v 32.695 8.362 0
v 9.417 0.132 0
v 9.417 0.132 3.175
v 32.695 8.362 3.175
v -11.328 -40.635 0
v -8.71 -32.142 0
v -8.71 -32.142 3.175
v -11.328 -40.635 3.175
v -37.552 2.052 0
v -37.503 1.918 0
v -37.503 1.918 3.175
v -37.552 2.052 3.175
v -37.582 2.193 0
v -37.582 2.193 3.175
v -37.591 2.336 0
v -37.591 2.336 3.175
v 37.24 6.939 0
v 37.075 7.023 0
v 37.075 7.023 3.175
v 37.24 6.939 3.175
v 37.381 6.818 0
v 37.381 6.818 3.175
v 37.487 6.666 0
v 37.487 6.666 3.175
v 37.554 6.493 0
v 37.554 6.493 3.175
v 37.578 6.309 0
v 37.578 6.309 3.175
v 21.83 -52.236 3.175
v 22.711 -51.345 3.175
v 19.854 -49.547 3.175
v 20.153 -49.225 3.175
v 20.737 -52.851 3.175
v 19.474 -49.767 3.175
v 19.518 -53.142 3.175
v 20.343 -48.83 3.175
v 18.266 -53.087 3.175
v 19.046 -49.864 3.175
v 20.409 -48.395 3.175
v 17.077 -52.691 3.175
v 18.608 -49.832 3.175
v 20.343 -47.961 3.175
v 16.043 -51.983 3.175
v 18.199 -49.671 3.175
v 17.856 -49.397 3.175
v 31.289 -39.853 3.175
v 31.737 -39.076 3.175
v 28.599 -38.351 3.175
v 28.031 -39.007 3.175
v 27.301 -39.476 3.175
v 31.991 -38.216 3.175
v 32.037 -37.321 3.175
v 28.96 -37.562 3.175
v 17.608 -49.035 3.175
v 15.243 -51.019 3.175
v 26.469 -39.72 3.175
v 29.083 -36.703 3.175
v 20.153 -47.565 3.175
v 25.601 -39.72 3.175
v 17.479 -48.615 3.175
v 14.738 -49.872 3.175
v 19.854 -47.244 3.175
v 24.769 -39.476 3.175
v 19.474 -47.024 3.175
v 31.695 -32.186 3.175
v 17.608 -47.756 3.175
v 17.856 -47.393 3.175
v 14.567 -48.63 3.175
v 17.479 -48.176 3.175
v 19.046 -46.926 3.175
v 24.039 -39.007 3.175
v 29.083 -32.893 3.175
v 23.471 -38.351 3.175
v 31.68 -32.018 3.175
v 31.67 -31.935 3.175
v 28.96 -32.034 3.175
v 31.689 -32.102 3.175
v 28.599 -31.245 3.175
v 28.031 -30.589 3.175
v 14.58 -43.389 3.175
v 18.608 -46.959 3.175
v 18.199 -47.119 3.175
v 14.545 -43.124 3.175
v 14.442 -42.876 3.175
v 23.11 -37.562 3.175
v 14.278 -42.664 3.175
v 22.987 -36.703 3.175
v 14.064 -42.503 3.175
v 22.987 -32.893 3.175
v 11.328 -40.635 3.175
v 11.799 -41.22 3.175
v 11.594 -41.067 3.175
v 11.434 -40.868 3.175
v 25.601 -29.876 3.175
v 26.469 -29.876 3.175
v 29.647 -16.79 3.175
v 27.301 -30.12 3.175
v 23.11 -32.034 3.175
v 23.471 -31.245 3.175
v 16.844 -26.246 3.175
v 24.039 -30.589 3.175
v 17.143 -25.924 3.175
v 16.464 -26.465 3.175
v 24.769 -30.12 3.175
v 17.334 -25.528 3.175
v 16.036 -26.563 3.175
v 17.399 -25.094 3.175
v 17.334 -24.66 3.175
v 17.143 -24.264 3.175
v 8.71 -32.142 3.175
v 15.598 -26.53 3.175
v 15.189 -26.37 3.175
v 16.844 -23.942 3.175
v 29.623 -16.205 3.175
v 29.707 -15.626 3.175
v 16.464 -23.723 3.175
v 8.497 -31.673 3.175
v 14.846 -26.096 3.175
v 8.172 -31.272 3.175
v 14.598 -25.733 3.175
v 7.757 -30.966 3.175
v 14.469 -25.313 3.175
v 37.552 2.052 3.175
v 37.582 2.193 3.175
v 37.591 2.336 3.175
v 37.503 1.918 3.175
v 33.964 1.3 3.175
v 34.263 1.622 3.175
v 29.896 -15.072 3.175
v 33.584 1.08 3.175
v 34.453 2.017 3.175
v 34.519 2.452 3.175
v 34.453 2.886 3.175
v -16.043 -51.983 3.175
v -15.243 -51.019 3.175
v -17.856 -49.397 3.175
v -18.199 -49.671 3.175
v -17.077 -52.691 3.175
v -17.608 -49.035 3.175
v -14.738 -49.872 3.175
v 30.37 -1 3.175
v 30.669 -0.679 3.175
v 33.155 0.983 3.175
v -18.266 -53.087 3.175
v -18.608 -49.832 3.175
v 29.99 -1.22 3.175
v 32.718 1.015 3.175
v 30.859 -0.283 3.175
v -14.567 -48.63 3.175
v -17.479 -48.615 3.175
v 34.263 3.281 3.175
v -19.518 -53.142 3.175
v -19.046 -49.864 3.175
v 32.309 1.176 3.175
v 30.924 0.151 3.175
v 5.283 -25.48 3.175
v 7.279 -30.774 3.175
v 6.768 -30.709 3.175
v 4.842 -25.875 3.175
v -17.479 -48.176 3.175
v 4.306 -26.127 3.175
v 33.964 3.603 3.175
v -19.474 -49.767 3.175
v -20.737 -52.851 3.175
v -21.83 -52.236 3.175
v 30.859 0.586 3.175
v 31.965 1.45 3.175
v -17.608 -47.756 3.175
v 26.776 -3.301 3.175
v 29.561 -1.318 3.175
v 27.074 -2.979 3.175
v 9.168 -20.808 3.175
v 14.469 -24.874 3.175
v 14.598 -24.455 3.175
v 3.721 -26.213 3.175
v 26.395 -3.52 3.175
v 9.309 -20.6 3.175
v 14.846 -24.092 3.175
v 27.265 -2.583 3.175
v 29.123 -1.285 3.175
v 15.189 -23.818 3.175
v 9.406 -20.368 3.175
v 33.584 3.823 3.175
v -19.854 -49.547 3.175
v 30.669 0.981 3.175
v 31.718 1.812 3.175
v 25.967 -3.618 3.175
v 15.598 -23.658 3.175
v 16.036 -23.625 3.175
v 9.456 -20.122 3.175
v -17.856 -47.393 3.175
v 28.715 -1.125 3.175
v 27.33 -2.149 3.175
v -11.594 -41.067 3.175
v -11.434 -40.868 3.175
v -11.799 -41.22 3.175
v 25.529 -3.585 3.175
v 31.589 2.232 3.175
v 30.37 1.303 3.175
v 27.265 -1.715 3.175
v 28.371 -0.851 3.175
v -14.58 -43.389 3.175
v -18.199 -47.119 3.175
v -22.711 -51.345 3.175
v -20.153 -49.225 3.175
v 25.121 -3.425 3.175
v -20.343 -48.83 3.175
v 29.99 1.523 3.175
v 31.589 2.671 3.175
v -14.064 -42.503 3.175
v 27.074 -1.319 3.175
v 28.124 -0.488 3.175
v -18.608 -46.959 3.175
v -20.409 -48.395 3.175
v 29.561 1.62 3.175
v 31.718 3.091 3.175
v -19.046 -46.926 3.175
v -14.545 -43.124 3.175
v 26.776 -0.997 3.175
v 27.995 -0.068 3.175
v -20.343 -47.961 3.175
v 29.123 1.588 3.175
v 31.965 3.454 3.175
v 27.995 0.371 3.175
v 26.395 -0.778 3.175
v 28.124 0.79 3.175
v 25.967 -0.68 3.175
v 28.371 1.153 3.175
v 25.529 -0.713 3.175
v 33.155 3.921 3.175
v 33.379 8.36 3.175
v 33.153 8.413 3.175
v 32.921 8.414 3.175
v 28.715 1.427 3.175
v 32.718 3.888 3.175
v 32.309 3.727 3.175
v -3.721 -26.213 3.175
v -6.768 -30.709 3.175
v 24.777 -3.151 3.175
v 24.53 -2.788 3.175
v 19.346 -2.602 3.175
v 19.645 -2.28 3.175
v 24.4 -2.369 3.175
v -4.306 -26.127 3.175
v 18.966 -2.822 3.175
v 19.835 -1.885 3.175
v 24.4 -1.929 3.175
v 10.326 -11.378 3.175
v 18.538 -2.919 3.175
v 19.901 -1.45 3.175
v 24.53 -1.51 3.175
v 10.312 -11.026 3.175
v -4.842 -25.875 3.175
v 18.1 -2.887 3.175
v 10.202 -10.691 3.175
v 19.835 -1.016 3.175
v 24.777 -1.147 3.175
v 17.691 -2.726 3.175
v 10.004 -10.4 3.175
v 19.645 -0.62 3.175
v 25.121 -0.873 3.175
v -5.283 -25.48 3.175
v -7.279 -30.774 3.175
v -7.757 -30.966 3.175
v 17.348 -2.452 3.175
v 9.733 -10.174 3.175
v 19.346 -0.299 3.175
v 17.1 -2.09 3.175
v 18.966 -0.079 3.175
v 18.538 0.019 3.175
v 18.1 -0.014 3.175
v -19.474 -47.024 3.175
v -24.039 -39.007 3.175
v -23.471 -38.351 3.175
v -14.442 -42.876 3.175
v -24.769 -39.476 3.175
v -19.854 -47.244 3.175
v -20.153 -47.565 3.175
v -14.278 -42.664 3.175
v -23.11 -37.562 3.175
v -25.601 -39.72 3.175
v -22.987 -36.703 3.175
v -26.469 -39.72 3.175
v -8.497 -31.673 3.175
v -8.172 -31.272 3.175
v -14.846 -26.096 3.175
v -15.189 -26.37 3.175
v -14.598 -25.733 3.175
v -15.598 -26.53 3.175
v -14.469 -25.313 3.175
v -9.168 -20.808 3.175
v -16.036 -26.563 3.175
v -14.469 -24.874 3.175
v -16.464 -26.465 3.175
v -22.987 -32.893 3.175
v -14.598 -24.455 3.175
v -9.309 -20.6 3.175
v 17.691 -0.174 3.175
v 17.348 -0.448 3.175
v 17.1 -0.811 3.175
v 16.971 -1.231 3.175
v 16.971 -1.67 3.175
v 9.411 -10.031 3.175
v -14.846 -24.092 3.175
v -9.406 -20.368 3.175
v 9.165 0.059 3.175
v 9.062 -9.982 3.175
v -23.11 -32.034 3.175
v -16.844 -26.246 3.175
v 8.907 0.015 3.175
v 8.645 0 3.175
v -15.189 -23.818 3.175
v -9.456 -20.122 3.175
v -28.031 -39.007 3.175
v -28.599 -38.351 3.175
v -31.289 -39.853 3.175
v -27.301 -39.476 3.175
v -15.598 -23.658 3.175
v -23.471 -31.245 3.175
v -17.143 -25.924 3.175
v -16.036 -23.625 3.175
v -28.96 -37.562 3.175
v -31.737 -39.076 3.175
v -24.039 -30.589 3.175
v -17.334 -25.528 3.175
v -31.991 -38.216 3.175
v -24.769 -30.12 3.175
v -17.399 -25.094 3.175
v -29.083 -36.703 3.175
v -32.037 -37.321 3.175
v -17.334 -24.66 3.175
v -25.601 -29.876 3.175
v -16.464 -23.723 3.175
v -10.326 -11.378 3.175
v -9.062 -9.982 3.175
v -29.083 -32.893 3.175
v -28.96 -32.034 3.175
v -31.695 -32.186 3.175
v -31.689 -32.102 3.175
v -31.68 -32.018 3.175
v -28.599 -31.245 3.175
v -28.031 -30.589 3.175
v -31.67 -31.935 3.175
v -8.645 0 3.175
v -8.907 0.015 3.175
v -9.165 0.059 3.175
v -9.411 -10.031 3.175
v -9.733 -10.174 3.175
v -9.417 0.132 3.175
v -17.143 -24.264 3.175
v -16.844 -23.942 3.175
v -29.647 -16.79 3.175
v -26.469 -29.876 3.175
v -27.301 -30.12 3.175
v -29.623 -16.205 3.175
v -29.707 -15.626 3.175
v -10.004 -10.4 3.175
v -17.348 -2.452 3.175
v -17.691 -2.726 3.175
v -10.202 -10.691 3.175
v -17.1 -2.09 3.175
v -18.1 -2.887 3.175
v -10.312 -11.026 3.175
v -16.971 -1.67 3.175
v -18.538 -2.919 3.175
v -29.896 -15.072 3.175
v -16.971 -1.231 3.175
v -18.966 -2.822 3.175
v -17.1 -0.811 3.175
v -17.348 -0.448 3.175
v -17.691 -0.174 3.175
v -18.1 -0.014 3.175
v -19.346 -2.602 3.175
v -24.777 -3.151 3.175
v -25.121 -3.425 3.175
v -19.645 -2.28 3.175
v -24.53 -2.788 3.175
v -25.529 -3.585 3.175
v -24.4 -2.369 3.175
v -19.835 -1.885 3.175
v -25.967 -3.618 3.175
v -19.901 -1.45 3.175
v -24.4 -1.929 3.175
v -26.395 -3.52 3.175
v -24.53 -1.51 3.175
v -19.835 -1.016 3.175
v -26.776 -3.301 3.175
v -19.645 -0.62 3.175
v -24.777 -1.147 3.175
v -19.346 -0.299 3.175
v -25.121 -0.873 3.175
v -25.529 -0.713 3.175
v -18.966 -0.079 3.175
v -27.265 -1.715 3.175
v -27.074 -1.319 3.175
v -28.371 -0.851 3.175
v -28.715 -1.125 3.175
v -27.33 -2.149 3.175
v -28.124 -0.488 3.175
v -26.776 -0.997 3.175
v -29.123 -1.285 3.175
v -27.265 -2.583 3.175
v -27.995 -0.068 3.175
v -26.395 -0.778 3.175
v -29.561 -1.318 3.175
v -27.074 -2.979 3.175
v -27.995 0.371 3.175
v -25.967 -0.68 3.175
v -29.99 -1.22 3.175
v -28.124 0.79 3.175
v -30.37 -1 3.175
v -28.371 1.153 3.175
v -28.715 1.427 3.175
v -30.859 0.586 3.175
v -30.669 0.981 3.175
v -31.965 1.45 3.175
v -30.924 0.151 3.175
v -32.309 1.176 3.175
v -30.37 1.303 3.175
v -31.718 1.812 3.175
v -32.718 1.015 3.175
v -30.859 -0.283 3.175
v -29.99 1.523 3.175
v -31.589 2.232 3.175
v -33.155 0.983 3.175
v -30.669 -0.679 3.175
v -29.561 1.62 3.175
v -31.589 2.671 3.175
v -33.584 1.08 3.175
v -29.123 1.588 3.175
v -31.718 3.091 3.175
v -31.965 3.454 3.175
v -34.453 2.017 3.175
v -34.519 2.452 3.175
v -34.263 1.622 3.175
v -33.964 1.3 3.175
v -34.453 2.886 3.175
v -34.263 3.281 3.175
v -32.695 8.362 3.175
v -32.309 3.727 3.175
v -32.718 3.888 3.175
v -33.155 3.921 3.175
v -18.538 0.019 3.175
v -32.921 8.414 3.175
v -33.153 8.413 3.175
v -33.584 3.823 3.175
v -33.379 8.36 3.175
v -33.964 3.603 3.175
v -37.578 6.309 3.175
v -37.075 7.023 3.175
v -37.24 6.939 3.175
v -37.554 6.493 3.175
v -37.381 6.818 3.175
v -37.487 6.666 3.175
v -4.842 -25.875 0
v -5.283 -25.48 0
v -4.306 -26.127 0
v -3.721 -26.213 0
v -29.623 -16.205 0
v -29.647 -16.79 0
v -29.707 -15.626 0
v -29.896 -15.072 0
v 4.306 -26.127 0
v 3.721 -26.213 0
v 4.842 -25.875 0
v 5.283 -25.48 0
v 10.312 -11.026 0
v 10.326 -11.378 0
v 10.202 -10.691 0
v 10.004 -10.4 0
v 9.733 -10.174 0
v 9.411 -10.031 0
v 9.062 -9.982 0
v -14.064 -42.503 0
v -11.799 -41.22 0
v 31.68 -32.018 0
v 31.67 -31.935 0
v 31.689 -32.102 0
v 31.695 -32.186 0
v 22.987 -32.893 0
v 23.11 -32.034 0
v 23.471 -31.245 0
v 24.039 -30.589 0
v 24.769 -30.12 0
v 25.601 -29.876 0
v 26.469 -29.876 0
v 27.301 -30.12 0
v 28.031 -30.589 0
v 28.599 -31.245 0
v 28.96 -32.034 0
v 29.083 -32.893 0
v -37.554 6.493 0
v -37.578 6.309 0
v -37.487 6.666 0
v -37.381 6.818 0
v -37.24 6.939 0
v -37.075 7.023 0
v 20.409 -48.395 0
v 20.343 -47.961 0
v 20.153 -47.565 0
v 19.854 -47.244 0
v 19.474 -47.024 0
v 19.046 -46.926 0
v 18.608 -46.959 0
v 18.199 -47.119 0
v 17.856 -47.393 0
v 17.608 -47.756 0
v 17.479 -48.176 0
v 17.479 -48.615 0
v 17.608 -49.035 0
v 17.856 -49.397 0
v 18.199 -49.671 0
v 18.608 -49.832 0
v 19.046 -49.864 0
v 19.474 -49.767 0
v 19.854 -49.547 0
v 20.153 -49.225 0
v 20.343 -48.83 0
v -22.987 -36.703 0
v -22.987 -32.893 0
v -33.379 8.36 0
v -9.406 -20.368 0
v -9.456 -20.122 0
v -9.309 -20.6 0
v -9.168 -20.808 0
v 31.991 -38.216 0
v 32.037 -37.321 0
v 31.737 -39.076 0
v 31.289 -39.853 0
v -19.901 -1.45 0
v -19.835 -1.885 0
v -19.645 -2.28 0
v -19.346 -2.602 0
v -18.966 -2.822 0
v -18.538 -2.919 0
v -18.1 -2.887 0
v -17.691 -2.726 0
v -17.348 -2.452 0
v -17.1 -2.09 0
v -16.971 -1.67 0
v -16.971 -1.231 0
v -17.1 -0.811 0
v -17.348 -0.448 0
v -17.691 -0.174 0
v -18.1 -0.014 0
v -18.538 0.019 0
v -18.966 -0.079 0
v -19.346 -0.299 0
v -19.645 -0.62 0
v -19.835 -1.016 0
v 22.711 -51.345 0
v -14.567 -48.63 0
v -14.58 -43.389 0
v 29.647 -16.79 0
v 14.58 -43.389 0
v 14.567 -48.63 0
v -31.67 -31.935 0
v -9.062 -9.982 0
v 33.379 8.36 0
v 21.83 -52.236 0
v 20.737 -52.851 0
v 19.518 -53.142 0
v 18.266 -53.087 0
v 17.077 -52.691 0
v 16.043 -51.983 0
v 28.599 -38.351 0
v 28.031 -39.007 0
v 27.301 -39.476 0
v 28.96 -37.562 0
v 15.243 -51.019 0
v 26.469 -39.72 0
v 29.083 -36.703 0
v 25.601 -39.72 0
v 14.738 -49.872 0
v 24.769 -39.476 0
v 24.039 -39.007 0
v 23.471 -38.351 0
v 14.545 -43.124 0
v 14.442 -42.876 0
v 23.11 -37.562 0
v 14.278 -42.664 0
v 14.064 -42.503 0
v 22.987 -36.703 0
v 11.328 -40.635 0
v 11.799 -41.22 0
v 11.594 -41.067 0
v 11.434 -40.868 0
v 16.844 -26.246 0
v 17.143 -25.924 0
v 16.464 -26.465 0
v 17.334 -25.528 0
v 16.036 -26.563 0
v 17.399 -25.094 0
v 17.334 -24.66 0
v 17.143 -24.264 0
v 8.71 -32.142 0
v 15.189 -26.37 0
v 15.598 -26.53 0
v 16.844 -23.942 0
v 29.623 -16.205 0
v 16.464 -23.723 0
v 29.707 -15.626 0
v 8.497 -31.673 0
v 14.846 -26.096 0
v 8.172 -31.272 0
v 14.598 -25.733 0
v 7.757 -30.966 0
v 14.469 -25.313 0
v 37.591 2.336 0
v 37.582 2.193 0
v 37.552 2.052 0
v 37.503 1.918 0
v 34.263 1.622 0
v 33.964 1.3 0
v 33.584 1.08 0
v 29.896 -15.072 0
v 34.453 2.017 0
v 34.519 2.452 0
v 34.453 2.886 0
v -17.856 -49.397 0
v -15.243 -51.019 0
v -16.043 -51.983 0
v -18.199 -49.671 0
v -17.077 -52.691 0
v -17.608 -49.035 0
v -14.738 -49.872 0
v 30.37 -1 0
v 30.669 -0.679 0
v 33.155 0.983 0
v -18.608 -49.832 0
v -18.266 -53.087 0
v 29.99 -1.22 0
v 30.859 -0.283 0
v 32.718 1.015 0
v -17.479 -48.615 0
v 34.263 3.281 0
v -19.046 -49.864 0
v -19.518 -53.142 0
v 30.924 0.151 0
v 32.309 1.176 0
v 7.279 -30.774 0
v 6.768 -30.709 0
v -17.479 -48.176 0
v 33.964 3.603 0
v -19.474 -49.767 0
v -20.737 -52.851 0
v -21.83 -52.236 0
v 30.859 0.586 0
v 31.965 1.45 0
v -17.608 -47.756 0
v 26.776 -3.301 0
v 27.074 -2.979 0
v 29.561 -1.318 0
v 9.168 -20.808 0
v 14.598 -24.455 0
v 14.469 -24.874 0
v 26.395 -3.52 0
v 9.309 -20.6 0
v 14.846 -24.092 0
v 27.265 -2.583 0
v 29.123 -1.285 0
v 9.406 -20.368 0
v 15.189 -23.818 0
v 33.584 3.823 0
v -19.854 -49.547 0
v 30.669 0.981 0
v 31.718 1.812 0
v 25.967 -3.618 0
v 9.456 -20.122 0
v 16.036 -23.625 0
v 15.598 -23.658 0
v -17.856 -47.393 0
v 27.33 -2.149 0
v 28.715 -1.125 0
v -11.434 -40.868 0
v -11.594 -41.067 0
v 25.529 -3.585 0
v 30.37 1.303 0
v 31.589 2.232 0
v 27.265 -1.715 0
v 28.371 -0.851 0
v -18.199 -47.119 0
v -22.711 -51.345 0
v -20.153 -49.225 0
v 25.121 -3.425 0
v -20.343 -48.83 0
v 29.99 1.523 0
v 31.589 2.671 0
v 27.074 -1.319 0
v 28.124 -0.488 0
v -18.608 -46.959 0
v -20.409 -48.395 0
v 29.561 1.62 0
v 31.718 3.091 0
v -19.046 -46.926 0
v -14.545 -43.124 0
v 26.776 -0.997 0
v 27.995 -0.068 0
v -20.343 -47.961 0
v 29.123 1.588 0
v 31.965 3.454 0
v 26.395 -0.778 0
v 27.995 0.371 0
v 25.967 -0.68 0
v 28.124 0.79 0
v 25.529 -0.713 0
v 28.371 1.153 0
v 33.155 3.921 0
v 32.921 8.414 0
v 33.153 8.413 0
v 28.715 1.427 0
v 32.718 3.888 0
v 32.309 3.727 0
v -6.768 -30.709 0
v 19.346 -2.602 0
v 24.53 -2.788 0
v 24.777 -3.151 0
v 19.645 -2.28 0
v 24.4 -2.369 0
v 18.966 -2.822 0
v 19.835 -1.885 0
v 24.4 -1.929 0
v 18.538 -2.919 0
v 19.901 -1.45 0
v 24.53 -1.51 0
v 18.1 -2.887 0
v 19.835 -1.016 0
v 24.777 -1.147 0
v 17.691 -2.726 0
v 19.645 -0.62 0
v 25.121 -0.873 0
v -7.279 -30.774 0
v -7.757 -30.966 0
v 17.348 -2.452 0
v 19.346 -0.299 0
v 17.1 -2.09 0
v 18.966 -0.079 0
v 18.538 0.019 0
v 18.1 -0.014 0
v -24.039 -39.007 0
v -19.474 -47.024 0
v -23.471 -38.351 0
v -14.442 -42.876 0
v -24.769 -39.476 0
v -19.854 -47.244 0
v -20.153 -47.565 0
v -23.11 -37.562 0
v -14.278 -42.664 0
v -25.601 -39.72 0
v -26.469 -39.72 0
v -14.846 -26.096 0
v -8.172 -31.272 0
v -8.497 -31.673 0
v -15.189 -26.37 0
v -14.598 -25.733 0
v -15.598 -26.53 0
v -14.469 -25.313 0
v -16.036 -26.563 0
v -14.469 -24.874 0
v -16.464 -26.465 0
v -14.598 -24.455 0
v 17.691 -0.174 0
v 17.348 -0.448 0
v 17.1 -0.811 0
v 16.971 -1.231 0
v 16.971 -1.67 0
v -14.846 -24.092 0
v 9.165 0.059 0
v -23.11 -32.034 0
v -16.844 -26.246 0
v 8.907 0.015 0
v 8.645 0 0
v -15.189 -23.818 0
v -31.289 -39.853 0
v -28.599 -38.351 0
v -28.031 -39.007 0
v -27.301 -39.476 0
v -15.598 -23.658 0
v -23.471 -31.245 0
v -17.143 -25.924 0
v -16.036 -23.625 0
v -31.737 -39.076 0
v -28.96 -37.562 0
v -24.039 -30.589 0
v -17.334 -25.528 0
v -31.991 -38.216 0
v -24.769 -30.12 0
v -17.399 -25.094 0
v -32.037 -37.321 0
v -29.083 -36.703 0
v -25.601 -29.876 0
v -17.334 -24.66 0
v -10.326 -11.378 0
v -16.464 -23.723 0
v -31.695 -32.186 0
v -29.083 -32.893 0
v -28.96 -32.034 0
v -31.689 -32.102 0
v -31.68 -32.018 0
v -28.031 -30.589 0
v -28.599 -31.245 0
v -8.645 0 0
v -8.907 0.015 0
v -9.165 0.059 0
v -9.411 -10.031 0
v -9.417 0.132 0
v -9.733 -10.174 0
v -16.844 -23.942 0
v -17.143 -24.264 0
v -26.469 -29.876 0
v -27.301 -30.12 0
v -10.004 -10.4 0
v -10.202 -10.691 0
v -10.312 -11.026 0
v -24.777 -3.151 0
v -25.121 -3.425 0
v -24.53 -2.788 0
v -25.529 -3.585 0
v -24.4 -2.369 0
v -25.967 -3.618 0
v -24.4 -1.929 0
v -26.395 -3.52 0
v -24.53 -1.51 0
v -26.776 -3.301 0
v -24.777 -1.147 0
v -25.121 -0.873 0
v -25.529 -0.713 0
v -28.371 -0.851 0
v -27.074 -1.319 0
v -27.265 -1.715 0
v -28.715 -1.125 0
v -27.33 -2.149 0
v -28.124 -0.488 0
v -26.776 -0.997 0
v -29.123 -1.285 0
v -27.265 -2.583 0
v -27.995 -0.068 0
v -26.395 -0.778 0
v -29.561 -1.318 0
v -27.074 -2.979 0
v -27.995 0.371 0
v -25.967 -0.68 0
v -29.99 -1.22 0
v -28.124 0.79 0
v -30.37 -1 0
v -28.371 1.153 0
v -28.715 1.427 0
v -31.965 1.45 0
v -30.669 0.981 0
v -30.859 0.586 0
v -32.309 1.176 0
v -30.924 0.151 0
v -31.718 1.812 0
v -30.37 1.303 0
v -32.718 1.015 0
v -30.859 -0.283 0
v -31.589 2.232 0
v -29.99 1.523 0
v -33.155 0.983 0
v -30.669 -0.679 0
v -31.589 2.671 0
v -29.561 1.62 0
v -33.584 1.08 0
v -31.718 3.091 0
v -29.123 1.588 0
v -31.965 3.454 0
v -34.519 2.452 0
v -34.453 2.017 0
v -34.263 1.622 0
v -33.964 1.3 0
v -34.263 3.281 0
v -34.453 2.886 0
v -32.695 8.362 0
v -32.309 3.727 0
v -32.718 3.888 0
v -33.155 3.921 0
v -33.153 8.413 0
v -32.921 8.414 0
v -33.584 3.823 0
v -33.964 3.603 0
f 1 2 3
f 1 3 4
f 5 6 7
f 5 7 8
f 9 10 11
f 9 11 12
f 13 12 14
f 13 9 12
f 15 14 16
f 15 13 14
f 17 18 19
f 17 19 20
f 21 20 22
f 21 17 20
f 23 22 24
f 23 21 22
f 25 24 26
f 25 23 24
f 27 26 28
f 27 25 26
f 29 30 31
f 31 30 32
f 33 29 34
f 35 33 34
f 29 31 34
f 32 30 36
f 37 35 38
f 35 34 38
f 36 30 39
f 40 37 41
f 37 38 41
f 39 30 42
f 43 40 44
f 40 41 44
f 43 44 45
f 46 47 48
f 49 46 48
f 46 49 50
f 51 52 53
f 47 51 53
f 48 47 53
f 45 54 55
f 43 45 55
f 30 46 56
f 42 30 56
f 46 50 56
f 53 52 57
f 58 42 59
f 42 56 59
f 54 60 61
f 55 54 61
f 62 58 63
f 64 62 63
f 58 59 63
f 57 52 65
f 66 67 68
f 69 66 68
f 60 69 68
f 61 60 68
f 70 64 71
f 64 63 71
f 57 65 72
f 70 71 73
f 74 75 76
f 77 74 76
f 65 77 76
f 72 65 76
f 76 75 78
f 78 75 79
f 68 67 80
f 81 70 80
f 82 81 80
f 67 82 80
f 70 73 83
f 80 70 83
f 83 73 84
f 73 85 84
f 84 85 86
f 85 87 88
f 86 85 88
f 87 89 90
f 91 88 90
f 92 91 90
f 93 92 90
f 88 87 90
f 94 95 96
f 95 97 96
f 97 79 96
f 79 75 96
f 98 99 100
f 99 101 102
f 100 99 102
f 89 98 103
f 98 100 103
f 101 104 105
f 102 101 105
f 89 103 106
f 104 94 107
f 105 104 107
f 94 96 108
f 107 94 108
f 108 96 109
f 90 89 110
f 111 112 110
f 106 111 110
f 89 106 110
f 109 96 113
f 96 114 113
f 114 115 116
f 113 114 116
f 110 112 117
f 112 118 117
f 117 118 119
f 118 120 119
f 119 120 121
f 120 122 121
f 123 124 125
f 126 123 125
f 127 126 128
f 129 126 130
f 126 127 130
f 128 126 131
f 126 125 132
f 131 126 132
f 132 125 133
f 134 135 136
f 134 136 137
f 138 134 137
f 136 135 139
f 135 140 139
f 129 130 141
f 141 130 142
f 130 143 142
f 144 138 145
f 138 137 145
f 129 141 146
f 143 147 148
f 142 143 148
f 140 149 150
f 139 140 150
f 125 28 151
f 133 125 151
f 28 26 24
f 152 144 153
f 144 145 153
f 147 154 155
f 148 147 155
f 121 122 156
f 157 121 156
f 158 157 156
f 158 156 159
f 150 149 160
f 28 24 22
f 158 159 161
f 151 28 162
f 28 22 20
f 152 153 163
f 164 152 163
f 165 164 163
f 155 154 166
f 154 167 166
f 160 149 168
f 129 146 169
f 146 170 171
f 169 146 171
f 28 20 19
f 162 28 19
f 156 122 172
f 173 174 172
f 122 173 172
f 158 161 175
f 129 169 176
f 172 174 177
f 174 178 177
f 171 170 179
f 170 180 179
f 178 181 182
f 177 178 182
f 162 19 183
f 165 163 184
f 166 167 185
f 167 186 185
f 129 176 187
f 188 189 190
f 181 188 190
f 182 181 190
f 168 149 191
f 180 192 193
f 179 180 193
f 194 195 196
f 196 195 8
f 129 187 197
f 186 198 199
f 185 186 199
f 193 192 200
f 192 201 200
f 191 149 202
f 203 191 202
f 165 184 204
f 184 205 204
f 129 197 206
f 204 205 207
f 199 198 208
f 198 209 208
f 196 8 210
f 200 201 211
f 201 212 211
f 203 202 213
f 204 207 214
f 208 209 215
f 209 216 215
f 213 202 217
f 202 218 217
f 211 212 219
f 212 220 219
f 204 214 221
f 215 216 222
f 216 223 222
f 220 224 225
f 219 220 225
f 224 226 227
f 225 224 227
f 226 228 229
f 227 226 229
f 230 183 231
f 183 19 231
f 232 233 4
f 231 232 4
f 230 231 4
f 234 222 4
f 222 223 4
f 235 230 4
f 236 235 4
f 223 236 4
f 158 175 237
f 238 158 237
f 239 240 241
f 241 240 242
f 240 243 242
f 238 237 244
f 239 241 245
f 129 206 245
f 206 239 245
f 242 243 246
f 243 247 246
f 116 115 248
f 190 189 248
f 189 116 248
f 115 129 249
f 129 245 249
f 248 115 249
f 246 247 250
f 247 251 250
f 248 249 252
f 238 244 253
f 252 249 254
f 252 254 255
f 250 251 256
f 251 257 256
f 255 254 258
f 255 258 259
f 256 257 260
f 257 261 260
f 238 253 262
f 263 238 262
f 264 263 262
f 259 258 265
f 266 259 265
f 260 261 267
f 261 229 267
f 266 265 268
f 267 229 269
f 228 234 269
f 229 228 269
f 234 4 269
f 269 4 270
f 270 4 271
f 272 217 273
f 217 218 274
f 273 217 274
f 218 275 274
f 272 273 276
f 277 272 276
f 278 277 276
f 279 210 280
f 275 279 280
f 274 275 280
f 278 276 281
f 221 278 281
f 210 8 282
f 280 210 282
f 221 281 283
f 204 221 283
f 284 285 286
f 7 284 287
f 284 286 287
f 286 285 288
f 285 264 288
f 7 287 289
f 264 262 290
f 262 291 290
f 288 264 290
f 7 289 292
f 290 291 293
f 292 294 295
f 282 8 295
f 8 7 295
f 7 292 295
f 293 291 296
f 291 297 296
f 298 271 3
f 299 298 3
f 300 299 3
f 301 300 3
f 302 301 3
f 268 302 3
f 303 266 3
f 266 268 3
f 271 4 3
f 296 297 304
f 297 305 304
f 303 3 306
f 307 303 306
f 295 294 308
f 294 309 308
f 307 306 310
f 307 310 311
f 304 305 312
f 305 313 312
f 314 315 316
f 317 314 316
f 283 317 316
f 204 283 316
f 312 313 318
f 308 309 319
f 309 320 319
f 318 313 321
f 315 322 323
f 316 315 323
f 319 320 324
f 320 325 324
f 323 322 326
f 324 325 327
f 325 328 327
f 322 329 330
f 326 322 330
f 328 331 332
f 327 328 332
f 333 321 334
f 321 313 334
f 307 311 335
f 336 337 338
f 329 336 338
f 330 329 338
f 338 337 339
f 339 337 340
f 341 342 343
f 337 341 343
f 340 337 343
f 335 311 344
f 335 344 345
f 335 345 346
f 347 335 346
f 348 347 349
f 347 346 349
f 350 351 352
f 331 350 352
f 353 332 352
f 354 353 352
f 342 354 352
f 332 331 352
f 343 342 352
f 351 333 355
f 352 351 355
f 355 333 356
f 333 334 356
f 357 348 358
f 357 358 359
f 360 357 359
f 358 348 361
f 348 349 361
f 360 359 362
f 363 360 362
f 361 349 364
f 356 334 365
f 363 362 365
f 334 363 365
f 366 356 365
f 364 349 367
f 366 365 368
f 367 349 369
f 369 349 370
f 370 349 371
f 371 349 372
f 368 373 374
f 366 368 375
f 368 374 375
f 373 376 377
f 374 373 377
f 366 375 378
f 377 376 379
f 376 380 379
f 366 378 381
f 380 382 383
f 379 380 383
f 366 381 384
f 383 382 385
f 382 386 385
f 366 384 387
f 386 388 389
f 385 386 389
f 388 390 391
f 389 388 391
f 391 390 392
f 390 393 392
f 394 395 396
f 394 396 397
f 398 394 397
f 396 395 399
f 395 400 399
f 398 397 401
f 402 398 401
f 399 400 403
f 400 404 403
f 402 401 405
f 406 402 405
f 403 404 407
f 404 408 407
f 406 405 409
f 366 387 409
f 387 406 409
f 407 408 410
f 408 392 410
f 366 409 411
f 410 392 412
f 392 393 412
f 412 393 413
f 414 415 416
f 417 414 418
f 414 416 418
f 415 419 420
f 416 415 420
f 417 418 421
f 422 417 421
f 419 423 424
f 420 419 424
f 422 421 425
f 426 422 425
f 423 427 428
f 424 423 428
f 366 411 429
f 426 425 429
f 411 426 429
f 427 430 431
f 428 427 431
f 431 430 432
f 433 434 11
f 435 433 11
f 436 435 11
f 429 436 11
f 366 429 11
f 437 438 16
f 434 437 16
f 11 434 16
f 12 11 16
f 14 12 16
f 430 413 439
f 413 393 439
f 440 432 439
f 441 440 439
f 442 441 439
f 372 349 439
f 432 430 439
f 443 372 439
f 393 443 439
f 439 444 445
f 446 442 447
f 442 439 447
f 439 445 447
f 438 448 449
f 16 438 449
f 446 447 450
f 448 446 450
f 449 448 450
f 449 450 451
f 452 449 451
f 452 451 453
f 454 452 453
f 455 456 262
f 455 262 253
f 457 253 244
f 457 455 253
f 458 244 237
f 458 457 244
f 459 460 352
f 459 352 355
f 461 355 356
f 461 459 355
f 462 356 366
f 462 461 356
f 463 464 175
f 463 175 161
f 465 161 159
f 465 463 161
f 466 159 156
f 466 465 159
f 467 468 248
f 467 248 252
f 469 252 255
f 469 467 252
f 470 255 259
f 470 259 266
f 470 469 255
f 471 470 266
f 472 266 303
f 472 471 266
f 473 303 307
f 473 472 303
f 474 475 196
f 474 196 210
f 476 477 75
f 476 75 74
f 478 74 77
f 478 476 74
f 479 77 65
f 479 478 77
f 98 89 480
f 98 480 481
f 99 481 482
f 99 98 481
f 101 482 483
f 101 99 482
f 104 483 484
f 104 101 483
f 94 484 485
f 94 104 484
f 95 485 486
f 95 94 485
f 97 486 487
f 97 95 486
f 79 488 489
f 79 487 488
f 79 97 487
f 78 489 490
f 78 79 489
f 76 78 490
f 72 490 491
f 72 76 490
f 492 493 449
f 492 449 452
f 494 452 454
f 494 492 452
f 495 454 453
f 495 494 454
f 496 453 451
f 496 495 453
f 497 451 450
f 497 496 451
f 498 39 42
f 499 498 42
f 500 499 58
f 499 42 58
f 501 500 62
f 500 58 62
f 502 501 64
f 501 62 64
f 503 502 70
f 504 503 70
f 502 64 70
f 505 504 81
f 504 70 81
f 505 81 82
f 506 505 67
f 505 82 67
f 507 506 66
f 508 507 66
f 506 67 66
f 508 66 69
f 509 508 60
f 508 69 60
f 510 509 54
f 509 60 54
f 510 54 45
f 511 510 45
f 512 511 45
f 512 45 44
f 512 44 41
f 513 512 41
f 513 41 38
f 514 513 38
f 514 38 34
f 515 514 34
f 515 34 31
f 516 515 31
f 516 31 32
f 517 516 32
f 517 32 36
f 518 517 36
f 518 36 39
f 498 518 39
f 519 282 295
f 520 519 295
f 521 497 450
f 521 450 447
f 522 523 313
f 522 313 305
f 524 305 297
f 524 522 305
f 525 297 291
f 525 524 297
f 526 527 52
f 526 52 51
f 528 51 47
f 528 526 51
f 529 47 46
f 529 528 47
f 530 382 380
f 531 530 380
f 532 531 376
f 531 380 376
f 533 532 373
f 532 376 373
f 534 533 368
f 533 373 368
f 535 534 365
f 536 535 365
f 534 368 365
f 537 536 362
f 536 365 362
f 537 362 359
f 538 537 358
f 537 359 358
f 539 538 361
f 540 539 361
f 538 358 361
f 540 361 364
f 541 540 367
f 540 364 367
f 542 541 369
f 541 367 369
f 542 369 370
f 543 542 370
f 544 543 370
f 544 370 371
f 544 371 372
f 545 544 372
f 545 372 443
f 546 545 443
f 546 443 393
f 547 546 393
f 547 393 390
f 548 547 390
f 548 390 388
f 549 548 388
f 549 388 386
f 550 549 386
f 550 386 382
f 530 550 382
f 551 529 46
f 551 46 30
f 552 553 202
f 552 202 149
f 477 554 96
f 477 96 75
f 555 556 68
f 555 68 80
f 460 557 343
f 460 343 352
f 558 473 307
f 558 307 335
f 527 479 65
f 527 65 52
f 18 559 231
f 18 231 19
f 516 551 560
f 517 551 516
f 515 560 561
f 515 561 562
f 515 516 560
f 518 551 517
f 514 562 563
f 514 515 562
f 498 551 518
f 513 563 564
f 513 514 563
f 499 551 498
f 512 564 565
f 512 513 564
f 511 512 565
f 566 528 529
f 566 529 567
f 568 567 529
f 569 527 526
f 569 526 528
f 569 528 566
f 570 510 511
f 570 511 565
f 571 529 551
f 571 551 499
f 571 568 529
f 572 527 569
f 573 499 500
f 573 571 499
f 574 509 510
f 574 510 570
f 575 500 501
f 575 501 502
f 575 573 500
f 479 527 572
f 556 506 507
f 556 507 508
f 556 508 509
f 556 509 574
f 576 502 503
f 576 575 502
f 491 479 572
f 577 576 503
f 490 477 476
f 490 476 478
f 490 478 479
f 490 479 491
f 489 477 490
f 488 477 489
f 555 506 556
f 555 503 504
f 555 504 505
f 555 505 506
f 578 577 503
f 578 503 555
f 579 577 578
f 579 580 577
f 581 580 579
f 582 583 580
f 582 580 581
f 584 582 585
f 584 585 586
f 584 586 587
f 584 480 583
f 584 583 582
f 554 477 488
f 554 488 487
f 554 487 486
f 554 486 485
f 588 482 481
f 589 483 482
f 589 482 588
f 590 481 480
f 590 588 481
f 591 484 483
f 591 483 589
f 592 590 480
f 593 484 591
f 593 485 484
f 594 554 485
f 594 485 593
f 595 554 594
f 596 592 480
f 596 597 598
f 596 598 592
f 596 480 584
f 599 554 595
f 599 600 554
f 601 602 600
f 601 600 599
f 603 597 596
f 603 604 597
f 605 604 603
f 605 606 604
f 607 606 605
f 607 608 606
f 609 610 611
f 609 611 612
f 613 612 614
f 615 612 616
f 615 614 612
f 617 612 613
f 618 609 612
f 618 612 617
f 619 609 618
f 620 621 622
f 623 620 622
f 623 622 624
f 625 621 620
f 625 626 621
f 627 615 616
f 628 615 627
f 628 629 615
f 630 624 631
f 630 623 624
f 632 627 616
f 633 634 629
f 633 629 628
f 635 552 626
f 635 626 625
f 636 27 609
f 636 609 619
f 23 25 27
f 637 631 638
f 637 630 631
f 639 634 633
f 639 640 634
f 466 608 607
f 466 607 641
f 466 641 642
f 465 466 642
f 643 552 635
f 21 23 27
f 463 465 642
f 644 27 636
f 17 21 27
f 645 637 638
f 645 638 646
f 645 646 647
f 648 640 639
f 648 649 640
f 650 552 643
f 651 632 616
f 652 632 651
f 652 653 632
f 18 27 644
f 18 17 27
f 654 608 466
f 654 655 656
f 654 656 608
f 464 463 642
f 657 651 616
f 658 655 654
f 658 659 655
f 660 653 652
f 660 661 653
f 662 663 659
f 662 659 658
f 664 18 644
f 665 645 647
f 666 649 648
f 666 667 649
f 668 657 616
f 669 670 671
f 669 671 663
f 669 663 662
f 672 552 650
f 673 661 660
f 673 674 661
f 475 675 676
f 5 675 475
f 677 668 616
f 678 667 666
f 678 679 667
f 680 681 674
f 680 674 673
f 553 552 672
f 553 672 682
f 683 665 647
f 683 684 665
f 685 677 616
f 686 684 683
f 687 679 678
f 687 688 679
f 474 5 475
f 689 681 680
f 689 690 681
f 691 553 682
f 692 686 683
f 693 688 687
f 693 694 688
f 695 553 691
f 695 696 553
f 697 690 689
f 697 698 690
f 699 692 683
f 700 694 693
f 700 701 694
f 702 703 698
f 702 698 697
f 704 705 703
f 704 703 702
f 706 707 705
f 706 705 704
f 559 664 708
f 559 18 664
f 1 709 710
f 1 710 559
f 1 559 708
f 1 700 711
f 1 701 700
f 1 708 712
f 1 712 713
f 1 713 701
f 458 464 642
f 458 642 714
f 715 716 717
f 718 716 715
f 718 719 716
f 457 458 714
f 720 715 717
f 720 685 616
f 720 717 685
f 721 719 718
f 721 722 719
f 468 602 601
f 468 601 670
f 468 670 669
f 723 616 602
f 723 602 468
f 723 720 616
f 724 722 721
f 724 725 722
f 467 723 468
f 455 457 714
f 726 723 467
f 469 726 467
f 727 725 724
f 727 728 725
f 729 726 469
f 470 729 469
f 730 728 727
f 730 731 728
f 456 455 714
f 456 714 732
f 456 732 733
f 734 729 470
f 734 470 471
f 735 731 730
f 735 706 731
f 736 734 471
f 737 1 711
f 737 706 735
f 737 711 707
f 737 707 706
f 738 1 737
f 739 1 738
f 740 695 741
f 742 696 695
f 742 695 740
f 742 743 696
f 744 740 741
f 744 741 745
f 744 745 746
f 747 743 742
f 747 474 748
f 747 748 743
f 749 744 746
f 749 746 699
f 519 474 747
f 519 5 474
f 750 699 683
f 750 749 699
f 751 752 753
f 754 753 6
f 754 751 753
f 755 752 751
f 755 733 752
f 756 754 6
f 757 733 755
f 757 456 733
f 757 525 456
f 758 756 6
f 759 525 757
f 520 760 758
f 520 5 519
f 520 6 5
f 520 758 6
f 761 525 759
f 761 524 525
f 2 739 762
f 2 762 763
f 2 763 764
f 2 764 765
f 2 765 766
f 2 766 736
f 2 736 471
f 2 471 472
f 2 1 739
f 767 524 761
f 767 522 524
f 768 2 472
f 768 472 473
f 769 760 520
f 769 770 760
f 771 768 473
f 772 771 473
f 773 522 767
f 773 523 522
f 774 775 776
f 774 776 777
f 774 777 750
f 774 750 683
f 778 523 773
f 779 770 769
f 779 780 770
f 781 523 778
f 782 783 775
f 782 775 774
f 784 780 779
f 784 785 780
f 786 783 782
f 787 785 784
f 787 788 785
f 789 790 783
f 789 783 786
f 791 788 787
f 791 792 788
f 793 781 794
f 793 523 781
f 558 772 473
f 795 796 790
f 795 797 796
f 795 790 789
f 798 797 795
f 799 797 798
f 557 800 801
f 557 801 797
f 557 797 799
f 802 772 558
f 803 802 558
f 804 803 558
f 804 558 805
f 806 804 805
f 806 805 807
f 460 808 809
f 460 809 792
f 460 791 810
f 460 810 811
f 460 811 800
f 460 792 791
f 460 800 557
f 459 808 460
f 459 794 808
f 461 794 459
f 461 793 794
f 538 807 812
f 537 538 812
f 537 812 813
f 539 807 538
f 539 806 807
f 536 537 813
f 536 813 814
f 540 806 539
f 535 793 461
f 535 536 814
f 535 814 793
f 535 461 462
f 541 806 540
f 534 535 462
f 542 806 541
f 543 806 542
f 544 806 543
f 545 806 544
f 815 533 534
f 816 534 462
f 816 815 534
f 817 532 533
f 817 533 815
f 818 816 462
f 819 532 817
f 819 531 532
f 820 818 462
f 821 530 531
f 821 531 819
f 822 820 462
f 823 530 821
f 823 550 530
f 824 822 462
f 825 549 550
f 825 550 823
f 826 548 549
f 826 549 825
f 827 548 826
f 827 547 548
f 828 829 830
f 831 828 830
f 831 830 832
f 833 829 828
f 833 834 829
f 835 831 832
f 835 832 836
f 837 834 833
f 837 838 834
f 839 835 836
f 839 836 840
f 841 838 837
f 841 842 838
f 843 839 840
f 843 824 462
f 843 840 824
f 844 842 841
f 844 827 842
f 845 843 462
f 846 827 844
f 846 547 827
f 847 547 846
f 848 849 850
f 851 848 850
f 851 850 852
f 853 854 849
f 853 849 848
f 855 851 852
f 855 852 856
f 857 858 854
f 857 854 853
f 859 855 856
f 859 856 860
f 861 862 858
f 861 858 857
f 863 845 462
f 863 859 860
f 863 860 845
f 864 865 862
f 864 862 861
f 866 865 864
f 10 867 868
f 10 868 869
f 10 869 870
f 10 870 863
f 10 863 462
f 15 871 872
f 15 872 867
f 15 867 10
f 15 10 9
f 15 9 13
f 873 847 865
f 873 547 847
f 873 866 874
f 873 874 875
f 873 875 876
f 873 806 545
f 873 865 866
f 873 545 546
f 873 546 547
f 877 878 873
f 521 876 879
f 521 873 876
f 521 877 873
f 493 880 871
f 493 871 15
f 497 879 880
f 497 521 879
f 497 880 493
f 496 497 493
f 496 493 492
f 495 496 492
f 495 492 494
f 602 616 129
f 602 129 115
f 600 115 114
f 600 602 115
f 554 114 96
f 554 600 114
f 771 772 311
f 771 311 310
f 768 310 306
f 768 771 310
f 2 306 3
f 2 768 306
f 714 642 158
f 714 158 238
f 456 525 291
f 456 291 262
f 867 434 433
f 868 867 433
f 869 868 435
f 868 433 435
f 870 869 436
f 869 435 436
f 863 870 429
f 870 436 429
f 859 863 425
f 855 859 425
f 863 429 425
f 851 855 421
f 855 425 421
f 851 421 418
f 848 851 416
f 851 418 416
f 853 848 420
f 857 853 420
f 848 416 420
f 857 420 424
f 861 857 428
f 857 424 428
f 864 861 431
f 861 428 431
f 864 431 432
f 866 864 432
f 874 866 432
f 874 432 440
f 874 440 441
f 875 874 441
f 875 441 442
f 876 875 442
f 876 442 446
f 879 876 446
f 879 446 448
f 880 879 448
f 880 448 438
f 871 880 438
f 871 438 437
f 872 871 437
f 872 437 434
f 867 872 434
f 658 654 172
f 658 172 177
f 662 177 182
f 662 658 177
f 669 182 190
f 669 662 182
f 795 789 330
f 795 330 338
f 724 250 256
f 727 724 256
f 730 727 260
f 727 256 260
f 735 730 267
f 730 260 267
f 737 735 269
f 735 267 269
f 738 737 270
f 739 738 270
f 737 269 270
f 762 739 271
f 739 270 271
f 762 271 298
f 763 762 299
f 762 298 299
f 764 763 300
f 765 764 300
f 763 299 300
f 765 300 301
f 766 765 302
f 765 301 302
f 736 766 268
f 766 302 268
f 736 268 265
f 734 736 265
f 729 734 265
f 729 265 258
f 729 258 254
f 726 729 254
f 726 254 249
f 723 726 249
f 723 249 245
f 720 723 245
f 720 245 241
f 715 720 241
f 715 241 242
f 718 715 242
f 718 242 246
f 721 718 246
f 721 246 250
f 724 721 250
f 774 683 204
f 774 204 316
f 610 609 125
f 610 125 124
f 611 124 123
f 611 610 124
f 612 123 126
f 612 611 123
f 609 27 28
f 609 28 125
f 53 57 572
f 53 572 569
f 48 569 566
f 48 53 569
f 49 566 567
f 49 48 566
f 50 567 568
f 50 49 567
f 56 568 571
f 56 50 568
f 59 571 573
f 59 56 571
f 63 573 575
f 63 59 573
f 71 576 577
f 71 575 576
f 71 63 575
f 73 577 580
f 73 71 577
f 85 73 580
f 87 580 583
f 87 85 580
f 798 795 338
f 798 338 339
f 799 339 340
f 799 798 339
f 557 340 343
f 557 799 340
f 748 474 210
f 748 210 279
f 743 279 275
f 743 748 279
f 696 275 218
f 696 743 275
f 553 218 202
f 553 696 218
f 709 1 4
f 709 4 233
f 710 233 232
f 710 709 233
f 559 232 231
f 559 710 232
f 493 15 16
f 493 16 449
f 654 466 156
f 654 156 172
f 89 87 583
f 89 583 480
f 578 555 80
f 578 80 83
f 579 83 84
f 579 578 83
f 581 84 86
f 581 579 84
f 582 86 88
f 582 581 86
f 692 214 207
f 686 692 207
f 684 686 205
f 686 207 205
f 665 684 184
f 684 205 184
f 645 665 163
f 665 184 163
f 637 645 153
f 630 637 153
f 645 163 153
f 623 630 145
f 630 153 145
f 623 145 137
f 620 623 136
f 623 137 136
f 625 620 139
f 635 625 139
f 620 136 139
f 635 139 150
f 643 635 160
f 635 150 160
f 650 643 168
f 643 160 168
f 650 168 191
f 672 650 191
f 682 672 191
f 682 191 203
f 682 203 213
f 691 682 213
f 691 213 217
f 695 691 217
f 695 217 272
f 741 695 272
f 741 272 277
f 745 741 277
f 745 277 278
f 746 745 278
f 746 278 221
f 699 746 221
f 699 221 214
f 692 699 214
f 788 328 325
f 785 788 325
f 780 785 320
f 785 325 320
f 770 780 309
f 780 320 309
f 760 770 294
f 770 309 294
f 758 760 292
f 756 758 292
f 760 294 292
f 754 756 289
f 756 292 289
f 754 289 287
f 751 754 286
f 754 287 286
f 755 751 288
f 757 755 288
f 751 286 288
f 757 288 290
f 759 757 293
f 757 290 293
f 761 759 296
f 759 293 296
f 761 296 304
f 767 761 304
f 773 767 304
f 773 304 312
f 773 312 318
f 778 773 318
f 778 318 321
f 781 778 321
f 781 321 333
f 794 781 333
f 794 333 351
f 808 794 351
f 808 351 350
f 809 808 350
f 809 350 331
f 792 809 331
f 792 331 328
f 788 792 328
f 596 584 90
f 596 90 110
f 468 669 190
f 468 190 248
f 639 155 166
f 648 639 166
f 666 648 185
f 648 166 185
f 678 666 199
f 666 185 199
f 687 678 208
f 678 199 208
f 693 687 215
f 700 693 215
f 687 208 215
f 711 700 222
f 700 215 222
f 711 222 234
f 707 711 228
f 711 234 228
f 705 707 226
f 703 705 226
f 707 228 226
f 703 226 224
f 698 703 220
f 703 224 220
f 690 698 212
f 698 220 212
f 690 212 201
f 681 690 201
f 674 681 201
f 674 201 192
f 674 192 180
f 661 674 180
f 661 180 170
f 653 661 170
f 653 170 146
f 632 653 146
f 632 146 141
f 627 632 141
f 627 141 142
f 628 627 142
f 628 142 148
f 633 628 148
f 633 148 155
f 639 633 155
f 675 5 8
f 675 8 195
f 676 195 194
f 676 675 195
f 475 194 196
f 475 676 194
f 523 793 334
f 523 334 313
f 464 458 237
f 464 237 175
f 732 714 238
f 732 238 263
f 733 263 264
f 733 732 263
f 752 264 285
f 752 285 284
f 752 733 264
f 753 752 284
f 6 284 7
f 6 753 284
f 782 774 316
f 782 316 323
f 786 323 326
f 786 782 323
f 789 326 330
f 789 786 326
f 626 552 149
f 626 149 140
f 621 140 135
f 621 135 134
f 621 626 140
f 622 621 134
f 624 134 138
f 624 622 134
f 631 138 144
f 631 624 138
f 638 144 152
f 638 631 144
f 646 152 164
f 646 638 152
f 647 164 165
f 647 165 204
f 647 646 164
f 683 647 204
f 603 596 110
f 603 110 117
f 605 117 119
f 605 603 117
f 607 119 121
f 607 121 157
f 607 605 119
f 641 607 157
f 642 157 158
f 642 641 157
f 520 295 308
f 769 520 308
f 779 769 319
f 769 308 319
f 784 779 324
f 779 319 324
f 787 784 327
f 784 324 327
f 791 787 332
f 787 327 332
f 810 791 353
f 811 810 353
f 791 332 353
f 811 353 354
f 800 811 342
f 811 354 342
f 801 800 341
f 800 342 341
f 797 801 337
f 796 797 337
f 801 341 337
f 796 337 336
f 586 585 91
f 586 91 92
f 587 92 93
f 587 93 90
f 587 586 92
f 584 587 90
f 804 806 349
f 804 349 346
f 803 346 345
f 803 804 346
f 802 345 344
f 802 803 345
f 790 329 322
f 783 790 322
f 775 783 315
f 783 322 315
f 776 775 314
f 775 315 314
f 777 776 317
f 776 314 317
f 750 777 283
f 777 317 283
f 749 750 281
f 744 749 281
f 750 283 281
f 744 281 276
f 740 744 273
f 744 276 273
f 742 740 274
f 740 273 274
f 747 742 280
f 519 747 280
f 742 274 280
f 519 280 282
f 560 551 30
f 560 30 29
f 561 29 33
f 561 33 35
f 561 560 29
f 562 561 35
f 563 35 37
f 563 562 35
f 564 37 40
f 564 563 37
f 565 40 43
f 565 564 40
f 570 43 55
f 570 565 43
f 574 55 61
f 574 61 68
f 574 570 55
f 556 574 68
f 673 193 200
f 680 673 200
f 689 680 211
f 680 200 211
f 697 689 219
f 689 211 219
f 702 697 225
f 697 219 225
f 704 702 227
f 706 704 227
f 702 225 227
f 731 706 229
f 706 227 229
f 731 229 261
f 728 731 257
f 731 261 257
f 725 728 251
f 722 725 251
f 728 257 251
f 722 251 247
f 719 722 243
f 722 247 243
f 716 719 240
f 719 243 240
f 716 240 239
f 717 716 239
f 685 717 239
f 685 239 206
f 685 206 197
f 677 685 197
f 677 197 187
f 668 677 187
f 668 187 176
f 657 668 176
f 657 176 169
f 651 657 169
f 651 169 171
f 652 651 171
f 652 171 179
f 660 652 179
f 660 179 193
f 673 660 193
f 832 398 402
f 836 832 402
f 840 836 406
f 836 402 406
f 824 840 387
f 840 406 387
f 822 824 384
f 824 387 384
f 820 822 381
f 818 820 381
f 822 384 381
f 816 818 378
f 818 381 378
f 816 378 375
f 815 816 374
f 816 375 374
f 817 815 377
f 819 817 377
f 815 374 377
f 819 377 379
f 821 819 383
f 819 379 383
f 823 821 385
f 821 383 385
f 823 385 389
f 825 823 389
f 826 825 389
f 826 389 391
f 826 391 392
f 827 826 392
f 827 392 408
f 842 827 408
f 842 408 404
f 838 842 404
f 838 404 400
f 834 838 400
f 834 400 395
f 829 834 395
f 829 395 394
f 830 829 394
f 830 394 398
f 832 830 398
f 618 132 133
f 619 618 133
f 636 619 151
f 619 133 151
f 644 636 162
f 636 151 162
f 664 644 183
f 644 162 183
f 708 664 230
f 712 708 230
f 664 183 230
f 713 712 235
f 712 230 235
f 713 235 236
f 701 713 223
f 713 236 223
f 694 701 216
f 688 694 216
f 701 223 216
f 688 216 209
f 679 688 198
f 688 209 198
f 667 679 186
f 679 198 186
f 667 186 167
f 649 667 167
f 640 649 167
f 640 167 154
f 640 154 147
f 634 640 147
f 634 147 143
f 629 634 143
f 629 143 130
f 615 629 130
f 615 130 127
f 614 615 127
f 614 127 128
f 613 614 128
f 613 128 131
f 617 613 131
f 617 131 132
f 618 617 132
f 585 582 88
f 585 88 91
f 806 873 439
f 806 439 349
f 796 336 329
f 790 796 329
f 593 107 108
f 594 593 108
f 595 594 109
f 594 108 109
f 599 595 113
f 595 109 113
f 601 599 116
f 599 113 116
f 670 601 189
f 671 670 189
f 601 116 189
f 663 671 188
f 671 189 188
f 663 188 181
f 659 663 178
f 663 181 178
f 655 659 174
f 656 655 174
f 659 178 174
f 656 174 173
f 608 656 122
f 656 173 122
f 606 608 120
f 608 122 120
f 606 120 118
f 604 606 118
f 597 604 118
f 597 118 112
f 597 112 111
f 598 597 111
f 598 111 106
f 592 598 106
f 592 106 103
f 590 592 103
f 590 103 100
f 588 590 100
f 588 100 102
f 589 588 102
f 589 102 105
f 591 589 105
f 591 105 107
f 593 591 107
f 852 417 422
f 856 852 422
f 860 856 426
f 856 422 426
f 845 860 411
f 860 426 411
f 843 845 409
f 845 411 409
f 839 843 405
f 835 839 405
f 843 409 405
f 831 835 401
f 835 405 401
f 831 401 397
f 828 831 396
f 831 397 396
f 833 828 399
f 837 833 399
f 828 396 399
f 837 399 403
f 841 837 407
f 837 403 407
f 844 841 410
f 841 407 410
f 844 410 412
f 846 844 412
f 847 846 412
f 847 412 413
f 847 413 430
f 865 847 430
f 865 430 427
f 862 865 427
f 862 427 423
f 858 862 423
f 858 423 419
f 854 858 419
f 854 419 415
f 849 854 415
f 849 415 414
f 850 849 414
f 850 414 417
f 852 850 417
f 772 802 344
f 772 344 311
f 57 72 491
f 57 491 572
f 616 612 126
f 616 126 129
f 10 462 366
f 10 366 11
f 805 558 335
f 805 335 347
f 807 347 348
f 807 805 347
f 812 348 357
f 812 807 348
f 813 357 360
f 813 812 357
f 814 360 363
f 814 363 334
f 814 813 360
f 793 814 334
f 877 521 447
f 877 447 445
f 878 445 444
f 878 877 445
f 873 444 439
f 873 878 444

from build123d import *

# Parameters (mm, degrees)
BOSS_EXTRUDE1_DEPTH = 3.175
SKETCH2_R           = 1.4732
CUT_EXTRUDE1_DEPTH  = 66.187440595


with BuildPart() as part:
    # Sketch1 → Boss-Extrude1 (new body)
    with BuildSketch(Plane.XY):
        with BuildLine():
            Line((-8.644986321, 0), (8.644986321, 0))
            ThreePointArc((8.644986321, 0), (9.036676671, 0.033358008), (9.41708521, 0.132471226))
            Line((9.41708521, 0.132471226), (32.695027169, 8.362466532))
            ThreePointArc((32.695027169, 8.362466532), (33.037413575, 8.420565737), (33.379365385, 8.359961043))
            Line((33.379365385, 8.359961043), (37.074831276, 7.022895104))
            ThreePointArc((37.074831276, 7.022895104), (37.438600447, 6.745086623), (37.577573101, 6.308976358))
            Line((37.577573101, 6.308976358), (37.591246654, 2.336170232))
            ThreePointArc((37.591246654, 2.336170232), (37.569195736, 2.122118926), (37.502559227, 1.917512522))
            Line((37.502559227, 1.917512522), (29.896170993, -15.072175319))
            ThreePointArc((29.896170993, -15.072175319), (29.651900561, -15.913690011), (29.646955985, -16.789926606))
            Line((29.646955985, -16.789926606), (31.669948024, -31.934678241))
            ThreePointArc((31.669948024, -31.934678241), (31.684578491, -32.059980985), (31.695052571, -32.185699407))
            Line((31.695052571, -32.185699407), (32.037376325, -37.320766007))
            ThreePointArc((32.037376325, -37.320766007), (31.88963719, -38.653858534), (31.289084234, -39.853149444))
            Line((31.289084234, -39.853149444), (22.711313793, -51.345361524))
            ThreePointArc((22.711313793, -51.345361524), (17.658131065, -52.930106933), (14.566913248, -48.630055061))
            Line((14.566913248, -48.630055061), (14.5796, -43.389351757))
            ThreePointArc((14.5796, -43.389351757), (14.441970337, -42.876278099), (14.064222513, -42.502790371))
            Line((14.064222513, -42.502790371), (11.798676805, -41.21993315))
            ThreePointArc((11.798676805, -41.21993315), (11.507576341, -40.972569428), (11.3284, -40.635191111))
            Line((11.3284, -40.635191111), (8.709628272, -32.14188038))
            ThreePointArc((8.709628272, -32.14188038), (7.974572044, -31.105726569), (6.767835591, -30.7086))
            Line((6.767835591, -30.7086), (-6.767835591, -30.7086))
            ThreePointArc((-6.767835591, -30.7086), (-7.974572044, -31.105726569), (-8.709628272, -32.14188038))
            Line((-8.709628272, -32.14188038), (-11.3284, -40.635191111))
            ThreePointArc((-11.3284, -40.635191111), (-11.507576341, -40.972569428), (-11.798676805, -41.21993315))
            Line((-11.798676805, -41.21993315), (-14.064222513, -42.502790371))
            ThreePointArc((-14.064222513, -42.502790371), (-14.441970337, -42.876278099), (-14.5796, -43.389351757))
            Line((-14.5796, -43.389351757), (-14.566913248, -48.630055061))
            ThreePointArc((-14.566913248, -48.630055061), (-17.658131065, -52.930106933), (-22.711313793, -51.345361524))
            Line((-22.711313793, -51.345361524), (-31.289084234, -39.853149444))
            ThreePointArc((-31.289084234, -39.853149444), (-31.88963719, -38.653858534), (-32.037376325, -37.320766007))
            Line((-32.037376325, -37.320766007), (-31.695052571, -32.185699407))
            ThreePointArc((-31.695052571, -32.185699407), (-31.684578491, -32.059980985), (-31.669948024, -31.934678241))
            Line((-31.669948024, -31.934678241), (-29.646955985, -16.789926606))
            ThreePointArc((-29.646955985, -16.789926606), (-29.651900561, -15.913690011), (-29.896170993, -15.072175319))
            Line((-29.896170993, -15.072175319), (-37.502559227, 1.917512522))
            ThreePointArc((-37.502559227, 1.917512522), (-37.569195736, 2.122118926), (-37.591246654, 2.336170232))
            Line((-37.591246654, 2.336170232), (-37.577573101, 6.308976358))
            ThreePointArc((-37.577573101, 6.308976358), (-37.438600447, 6.745086623), (-37.074831276, 7.022895104))
            Line((-37.074831276, 7.022895104), (-33.379365385, 8.359961043))
            ThreePointArc((-33.379365385, 8.359961043), (-33.037413575, 8.420565737), (-32.695027169, 8.362466532))
            Line((-32.695027169, 8.362466532), (-9.41708521, 0.132471226))
            ThreePointArc((-9.41708521, 0.132471226), (-9.036676671, 0.033358008), (-8.644986321, 0))
        make_face()
        with BuildLine():
            Line((-3.720594556, -26.2128), (3.720594556, -26.2128))
            ThreePointArc((3.720594556, -26.2128), (4.583419353, -26.020516655), (5.282950018, -25.480057253))
            Line((5.282950018, -25.480057253), (9.168332687, -20.807888736))
            ThreePointArc((9.168332687, -20.807888736), (9.363351592, -20.486269793), (9.455616357, -20.121635275))
            Line((9.455616357, -20.121635275), (10.325877008, -11.377982322))
            ThreePointArc((10.325877008, -11.377982322), (10.003567813, -10.39980442), (9.062121174, -9.9822))
            Line((9.062121174, -9.9822), (-9.062121174, -9.9822))
            ThreePointArc((-9.062121174, -9.9822), (-10.003567813, -10.39980442), (-10.325877008, -11.377982322))
            Line((-10.325877008, -11.377982322), (-9.455616357, -20.121635275))
            ThreePointArc((-9.455616357, -20.121635275), (-9.363351592, -20.486269793), (-9.168332687, -20.807888736))
            Line((-9.168332687, -20.807888736), (-5.282950018, -25.480057253))
            ThreePointArc((-5.282950018, -25.480057253), (-4.583419353, -26.020516655), (-3.720594556, -26.2128))
        make_face(mode=Mode.SUBTRACT)
    extrude(amount=BOSS_EXTRUDE1_DEPTH)

    # Sketch2 → Cut-Extrude1 (cut, through all)
    with BuildSketch(Plane.XY.offset(3.175)):
        with Locations((33.0454, 2.451609921)):
            Circle(SKETCH2_R)
        with Locations((29.4513, 0.151296675)):
            Circle(SKETCH2_R)
        with Locations((25.8572, -2.149016571)):
            Circle(SKETCH2_R)
        with Locations((18.4277, -1.450311364)):
            Circle(SKETCH2_R)
        with Locations((15.9258, -25.093922391)):
            Circle(SKETCH2_R)
        with Locations((18.9357, -48.395328507)):
            Circle(SKETCH2_R)
        with Locations(Location((-18.9357, -48.395328507, 0), (0, 0, 180))):
            Circle(SKETCH2_R)
        with Locations(Location((-15.9258, -25.093922391, 0), (0, 0, 180))):
            Circle(SKETCH2_R)
        with Locations(Location((-18.4277, -1.450311364, 0), (0, 0, 180))):
            Circle(SKETCH2_R)
        with Locations(Location((-25.8572, -2.149016571, 0), (0, 0, 180))):
            Circle(SKETCH2_R)
        with Locations(Location((-29.4513, 0.151296675, 0), (0, 0, 180))):
            Circle(SKETCH2_R)
        with Locations(Location((-33.0454, 2.451609921, 0), (0, 0, 180))):
            Circle(SKETCH2_R)
        with BuildLine():
            Line((29.083, -32.893), (29.083, -36.703))
            ThreePointArc((29.083, -36.703), (26.035, -39.751), (22.987, -36.703))
            Line((22.987, -36.703), (22.987, -32.893))
            ThreePointArc((22.987, -32.893), (26.035, -29.845), (29.083, -32.893))
        make_face()
        with BuildLine():
            Line((-29.083, -32.893), (-29.083, -36.703))
            ThreePointArc((-29.083, -36.703), (-26.035, -39.751), (-22.987, -36.703))
            Line((-22.987, -36.703), (-22.987, -32.893))
            ThreePointArc((-22.987, -32.893), (-26.035, -29.845), (-29.083, -32.893))
        make_face()
    extrude(amount=-CUT_EXTRUDE1_DEPTH, mode=Mode.SUBTRACT)


solid = part.part
